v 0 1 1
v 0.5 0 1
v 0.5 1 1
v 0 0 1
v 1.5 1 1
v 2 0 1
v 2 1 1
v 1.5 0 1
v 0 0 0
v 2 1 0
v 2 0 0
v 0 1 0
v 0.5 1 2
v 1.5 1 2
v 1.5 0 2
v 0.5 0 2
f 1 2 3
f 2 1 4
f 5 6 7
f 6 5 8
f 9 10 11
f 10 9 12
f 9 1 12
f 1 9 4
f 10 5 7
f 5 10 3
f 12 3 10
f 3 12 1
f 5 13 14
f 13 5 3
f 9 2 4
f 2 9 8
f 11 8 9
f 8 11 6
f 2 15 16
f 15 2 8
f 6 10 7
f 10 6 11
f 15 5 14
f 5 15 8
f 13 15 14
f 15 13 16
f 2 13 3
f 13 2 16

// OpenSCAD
// LIBGL_ALWAYS_SOFTWARE=1 openscad --projection=ortho --imgsize=83,83 -o /tmp/o.png /tmp/blocks.scad --camera=1,0.5,1,60,0,45,14

color([0.16, 0.27, 0.78]) cube();
color([0.27, 0.79, 0]) translate([1,0,0])cube();
color([0.84, 0.22, 0]) translate([0.5,0,1])cube();
